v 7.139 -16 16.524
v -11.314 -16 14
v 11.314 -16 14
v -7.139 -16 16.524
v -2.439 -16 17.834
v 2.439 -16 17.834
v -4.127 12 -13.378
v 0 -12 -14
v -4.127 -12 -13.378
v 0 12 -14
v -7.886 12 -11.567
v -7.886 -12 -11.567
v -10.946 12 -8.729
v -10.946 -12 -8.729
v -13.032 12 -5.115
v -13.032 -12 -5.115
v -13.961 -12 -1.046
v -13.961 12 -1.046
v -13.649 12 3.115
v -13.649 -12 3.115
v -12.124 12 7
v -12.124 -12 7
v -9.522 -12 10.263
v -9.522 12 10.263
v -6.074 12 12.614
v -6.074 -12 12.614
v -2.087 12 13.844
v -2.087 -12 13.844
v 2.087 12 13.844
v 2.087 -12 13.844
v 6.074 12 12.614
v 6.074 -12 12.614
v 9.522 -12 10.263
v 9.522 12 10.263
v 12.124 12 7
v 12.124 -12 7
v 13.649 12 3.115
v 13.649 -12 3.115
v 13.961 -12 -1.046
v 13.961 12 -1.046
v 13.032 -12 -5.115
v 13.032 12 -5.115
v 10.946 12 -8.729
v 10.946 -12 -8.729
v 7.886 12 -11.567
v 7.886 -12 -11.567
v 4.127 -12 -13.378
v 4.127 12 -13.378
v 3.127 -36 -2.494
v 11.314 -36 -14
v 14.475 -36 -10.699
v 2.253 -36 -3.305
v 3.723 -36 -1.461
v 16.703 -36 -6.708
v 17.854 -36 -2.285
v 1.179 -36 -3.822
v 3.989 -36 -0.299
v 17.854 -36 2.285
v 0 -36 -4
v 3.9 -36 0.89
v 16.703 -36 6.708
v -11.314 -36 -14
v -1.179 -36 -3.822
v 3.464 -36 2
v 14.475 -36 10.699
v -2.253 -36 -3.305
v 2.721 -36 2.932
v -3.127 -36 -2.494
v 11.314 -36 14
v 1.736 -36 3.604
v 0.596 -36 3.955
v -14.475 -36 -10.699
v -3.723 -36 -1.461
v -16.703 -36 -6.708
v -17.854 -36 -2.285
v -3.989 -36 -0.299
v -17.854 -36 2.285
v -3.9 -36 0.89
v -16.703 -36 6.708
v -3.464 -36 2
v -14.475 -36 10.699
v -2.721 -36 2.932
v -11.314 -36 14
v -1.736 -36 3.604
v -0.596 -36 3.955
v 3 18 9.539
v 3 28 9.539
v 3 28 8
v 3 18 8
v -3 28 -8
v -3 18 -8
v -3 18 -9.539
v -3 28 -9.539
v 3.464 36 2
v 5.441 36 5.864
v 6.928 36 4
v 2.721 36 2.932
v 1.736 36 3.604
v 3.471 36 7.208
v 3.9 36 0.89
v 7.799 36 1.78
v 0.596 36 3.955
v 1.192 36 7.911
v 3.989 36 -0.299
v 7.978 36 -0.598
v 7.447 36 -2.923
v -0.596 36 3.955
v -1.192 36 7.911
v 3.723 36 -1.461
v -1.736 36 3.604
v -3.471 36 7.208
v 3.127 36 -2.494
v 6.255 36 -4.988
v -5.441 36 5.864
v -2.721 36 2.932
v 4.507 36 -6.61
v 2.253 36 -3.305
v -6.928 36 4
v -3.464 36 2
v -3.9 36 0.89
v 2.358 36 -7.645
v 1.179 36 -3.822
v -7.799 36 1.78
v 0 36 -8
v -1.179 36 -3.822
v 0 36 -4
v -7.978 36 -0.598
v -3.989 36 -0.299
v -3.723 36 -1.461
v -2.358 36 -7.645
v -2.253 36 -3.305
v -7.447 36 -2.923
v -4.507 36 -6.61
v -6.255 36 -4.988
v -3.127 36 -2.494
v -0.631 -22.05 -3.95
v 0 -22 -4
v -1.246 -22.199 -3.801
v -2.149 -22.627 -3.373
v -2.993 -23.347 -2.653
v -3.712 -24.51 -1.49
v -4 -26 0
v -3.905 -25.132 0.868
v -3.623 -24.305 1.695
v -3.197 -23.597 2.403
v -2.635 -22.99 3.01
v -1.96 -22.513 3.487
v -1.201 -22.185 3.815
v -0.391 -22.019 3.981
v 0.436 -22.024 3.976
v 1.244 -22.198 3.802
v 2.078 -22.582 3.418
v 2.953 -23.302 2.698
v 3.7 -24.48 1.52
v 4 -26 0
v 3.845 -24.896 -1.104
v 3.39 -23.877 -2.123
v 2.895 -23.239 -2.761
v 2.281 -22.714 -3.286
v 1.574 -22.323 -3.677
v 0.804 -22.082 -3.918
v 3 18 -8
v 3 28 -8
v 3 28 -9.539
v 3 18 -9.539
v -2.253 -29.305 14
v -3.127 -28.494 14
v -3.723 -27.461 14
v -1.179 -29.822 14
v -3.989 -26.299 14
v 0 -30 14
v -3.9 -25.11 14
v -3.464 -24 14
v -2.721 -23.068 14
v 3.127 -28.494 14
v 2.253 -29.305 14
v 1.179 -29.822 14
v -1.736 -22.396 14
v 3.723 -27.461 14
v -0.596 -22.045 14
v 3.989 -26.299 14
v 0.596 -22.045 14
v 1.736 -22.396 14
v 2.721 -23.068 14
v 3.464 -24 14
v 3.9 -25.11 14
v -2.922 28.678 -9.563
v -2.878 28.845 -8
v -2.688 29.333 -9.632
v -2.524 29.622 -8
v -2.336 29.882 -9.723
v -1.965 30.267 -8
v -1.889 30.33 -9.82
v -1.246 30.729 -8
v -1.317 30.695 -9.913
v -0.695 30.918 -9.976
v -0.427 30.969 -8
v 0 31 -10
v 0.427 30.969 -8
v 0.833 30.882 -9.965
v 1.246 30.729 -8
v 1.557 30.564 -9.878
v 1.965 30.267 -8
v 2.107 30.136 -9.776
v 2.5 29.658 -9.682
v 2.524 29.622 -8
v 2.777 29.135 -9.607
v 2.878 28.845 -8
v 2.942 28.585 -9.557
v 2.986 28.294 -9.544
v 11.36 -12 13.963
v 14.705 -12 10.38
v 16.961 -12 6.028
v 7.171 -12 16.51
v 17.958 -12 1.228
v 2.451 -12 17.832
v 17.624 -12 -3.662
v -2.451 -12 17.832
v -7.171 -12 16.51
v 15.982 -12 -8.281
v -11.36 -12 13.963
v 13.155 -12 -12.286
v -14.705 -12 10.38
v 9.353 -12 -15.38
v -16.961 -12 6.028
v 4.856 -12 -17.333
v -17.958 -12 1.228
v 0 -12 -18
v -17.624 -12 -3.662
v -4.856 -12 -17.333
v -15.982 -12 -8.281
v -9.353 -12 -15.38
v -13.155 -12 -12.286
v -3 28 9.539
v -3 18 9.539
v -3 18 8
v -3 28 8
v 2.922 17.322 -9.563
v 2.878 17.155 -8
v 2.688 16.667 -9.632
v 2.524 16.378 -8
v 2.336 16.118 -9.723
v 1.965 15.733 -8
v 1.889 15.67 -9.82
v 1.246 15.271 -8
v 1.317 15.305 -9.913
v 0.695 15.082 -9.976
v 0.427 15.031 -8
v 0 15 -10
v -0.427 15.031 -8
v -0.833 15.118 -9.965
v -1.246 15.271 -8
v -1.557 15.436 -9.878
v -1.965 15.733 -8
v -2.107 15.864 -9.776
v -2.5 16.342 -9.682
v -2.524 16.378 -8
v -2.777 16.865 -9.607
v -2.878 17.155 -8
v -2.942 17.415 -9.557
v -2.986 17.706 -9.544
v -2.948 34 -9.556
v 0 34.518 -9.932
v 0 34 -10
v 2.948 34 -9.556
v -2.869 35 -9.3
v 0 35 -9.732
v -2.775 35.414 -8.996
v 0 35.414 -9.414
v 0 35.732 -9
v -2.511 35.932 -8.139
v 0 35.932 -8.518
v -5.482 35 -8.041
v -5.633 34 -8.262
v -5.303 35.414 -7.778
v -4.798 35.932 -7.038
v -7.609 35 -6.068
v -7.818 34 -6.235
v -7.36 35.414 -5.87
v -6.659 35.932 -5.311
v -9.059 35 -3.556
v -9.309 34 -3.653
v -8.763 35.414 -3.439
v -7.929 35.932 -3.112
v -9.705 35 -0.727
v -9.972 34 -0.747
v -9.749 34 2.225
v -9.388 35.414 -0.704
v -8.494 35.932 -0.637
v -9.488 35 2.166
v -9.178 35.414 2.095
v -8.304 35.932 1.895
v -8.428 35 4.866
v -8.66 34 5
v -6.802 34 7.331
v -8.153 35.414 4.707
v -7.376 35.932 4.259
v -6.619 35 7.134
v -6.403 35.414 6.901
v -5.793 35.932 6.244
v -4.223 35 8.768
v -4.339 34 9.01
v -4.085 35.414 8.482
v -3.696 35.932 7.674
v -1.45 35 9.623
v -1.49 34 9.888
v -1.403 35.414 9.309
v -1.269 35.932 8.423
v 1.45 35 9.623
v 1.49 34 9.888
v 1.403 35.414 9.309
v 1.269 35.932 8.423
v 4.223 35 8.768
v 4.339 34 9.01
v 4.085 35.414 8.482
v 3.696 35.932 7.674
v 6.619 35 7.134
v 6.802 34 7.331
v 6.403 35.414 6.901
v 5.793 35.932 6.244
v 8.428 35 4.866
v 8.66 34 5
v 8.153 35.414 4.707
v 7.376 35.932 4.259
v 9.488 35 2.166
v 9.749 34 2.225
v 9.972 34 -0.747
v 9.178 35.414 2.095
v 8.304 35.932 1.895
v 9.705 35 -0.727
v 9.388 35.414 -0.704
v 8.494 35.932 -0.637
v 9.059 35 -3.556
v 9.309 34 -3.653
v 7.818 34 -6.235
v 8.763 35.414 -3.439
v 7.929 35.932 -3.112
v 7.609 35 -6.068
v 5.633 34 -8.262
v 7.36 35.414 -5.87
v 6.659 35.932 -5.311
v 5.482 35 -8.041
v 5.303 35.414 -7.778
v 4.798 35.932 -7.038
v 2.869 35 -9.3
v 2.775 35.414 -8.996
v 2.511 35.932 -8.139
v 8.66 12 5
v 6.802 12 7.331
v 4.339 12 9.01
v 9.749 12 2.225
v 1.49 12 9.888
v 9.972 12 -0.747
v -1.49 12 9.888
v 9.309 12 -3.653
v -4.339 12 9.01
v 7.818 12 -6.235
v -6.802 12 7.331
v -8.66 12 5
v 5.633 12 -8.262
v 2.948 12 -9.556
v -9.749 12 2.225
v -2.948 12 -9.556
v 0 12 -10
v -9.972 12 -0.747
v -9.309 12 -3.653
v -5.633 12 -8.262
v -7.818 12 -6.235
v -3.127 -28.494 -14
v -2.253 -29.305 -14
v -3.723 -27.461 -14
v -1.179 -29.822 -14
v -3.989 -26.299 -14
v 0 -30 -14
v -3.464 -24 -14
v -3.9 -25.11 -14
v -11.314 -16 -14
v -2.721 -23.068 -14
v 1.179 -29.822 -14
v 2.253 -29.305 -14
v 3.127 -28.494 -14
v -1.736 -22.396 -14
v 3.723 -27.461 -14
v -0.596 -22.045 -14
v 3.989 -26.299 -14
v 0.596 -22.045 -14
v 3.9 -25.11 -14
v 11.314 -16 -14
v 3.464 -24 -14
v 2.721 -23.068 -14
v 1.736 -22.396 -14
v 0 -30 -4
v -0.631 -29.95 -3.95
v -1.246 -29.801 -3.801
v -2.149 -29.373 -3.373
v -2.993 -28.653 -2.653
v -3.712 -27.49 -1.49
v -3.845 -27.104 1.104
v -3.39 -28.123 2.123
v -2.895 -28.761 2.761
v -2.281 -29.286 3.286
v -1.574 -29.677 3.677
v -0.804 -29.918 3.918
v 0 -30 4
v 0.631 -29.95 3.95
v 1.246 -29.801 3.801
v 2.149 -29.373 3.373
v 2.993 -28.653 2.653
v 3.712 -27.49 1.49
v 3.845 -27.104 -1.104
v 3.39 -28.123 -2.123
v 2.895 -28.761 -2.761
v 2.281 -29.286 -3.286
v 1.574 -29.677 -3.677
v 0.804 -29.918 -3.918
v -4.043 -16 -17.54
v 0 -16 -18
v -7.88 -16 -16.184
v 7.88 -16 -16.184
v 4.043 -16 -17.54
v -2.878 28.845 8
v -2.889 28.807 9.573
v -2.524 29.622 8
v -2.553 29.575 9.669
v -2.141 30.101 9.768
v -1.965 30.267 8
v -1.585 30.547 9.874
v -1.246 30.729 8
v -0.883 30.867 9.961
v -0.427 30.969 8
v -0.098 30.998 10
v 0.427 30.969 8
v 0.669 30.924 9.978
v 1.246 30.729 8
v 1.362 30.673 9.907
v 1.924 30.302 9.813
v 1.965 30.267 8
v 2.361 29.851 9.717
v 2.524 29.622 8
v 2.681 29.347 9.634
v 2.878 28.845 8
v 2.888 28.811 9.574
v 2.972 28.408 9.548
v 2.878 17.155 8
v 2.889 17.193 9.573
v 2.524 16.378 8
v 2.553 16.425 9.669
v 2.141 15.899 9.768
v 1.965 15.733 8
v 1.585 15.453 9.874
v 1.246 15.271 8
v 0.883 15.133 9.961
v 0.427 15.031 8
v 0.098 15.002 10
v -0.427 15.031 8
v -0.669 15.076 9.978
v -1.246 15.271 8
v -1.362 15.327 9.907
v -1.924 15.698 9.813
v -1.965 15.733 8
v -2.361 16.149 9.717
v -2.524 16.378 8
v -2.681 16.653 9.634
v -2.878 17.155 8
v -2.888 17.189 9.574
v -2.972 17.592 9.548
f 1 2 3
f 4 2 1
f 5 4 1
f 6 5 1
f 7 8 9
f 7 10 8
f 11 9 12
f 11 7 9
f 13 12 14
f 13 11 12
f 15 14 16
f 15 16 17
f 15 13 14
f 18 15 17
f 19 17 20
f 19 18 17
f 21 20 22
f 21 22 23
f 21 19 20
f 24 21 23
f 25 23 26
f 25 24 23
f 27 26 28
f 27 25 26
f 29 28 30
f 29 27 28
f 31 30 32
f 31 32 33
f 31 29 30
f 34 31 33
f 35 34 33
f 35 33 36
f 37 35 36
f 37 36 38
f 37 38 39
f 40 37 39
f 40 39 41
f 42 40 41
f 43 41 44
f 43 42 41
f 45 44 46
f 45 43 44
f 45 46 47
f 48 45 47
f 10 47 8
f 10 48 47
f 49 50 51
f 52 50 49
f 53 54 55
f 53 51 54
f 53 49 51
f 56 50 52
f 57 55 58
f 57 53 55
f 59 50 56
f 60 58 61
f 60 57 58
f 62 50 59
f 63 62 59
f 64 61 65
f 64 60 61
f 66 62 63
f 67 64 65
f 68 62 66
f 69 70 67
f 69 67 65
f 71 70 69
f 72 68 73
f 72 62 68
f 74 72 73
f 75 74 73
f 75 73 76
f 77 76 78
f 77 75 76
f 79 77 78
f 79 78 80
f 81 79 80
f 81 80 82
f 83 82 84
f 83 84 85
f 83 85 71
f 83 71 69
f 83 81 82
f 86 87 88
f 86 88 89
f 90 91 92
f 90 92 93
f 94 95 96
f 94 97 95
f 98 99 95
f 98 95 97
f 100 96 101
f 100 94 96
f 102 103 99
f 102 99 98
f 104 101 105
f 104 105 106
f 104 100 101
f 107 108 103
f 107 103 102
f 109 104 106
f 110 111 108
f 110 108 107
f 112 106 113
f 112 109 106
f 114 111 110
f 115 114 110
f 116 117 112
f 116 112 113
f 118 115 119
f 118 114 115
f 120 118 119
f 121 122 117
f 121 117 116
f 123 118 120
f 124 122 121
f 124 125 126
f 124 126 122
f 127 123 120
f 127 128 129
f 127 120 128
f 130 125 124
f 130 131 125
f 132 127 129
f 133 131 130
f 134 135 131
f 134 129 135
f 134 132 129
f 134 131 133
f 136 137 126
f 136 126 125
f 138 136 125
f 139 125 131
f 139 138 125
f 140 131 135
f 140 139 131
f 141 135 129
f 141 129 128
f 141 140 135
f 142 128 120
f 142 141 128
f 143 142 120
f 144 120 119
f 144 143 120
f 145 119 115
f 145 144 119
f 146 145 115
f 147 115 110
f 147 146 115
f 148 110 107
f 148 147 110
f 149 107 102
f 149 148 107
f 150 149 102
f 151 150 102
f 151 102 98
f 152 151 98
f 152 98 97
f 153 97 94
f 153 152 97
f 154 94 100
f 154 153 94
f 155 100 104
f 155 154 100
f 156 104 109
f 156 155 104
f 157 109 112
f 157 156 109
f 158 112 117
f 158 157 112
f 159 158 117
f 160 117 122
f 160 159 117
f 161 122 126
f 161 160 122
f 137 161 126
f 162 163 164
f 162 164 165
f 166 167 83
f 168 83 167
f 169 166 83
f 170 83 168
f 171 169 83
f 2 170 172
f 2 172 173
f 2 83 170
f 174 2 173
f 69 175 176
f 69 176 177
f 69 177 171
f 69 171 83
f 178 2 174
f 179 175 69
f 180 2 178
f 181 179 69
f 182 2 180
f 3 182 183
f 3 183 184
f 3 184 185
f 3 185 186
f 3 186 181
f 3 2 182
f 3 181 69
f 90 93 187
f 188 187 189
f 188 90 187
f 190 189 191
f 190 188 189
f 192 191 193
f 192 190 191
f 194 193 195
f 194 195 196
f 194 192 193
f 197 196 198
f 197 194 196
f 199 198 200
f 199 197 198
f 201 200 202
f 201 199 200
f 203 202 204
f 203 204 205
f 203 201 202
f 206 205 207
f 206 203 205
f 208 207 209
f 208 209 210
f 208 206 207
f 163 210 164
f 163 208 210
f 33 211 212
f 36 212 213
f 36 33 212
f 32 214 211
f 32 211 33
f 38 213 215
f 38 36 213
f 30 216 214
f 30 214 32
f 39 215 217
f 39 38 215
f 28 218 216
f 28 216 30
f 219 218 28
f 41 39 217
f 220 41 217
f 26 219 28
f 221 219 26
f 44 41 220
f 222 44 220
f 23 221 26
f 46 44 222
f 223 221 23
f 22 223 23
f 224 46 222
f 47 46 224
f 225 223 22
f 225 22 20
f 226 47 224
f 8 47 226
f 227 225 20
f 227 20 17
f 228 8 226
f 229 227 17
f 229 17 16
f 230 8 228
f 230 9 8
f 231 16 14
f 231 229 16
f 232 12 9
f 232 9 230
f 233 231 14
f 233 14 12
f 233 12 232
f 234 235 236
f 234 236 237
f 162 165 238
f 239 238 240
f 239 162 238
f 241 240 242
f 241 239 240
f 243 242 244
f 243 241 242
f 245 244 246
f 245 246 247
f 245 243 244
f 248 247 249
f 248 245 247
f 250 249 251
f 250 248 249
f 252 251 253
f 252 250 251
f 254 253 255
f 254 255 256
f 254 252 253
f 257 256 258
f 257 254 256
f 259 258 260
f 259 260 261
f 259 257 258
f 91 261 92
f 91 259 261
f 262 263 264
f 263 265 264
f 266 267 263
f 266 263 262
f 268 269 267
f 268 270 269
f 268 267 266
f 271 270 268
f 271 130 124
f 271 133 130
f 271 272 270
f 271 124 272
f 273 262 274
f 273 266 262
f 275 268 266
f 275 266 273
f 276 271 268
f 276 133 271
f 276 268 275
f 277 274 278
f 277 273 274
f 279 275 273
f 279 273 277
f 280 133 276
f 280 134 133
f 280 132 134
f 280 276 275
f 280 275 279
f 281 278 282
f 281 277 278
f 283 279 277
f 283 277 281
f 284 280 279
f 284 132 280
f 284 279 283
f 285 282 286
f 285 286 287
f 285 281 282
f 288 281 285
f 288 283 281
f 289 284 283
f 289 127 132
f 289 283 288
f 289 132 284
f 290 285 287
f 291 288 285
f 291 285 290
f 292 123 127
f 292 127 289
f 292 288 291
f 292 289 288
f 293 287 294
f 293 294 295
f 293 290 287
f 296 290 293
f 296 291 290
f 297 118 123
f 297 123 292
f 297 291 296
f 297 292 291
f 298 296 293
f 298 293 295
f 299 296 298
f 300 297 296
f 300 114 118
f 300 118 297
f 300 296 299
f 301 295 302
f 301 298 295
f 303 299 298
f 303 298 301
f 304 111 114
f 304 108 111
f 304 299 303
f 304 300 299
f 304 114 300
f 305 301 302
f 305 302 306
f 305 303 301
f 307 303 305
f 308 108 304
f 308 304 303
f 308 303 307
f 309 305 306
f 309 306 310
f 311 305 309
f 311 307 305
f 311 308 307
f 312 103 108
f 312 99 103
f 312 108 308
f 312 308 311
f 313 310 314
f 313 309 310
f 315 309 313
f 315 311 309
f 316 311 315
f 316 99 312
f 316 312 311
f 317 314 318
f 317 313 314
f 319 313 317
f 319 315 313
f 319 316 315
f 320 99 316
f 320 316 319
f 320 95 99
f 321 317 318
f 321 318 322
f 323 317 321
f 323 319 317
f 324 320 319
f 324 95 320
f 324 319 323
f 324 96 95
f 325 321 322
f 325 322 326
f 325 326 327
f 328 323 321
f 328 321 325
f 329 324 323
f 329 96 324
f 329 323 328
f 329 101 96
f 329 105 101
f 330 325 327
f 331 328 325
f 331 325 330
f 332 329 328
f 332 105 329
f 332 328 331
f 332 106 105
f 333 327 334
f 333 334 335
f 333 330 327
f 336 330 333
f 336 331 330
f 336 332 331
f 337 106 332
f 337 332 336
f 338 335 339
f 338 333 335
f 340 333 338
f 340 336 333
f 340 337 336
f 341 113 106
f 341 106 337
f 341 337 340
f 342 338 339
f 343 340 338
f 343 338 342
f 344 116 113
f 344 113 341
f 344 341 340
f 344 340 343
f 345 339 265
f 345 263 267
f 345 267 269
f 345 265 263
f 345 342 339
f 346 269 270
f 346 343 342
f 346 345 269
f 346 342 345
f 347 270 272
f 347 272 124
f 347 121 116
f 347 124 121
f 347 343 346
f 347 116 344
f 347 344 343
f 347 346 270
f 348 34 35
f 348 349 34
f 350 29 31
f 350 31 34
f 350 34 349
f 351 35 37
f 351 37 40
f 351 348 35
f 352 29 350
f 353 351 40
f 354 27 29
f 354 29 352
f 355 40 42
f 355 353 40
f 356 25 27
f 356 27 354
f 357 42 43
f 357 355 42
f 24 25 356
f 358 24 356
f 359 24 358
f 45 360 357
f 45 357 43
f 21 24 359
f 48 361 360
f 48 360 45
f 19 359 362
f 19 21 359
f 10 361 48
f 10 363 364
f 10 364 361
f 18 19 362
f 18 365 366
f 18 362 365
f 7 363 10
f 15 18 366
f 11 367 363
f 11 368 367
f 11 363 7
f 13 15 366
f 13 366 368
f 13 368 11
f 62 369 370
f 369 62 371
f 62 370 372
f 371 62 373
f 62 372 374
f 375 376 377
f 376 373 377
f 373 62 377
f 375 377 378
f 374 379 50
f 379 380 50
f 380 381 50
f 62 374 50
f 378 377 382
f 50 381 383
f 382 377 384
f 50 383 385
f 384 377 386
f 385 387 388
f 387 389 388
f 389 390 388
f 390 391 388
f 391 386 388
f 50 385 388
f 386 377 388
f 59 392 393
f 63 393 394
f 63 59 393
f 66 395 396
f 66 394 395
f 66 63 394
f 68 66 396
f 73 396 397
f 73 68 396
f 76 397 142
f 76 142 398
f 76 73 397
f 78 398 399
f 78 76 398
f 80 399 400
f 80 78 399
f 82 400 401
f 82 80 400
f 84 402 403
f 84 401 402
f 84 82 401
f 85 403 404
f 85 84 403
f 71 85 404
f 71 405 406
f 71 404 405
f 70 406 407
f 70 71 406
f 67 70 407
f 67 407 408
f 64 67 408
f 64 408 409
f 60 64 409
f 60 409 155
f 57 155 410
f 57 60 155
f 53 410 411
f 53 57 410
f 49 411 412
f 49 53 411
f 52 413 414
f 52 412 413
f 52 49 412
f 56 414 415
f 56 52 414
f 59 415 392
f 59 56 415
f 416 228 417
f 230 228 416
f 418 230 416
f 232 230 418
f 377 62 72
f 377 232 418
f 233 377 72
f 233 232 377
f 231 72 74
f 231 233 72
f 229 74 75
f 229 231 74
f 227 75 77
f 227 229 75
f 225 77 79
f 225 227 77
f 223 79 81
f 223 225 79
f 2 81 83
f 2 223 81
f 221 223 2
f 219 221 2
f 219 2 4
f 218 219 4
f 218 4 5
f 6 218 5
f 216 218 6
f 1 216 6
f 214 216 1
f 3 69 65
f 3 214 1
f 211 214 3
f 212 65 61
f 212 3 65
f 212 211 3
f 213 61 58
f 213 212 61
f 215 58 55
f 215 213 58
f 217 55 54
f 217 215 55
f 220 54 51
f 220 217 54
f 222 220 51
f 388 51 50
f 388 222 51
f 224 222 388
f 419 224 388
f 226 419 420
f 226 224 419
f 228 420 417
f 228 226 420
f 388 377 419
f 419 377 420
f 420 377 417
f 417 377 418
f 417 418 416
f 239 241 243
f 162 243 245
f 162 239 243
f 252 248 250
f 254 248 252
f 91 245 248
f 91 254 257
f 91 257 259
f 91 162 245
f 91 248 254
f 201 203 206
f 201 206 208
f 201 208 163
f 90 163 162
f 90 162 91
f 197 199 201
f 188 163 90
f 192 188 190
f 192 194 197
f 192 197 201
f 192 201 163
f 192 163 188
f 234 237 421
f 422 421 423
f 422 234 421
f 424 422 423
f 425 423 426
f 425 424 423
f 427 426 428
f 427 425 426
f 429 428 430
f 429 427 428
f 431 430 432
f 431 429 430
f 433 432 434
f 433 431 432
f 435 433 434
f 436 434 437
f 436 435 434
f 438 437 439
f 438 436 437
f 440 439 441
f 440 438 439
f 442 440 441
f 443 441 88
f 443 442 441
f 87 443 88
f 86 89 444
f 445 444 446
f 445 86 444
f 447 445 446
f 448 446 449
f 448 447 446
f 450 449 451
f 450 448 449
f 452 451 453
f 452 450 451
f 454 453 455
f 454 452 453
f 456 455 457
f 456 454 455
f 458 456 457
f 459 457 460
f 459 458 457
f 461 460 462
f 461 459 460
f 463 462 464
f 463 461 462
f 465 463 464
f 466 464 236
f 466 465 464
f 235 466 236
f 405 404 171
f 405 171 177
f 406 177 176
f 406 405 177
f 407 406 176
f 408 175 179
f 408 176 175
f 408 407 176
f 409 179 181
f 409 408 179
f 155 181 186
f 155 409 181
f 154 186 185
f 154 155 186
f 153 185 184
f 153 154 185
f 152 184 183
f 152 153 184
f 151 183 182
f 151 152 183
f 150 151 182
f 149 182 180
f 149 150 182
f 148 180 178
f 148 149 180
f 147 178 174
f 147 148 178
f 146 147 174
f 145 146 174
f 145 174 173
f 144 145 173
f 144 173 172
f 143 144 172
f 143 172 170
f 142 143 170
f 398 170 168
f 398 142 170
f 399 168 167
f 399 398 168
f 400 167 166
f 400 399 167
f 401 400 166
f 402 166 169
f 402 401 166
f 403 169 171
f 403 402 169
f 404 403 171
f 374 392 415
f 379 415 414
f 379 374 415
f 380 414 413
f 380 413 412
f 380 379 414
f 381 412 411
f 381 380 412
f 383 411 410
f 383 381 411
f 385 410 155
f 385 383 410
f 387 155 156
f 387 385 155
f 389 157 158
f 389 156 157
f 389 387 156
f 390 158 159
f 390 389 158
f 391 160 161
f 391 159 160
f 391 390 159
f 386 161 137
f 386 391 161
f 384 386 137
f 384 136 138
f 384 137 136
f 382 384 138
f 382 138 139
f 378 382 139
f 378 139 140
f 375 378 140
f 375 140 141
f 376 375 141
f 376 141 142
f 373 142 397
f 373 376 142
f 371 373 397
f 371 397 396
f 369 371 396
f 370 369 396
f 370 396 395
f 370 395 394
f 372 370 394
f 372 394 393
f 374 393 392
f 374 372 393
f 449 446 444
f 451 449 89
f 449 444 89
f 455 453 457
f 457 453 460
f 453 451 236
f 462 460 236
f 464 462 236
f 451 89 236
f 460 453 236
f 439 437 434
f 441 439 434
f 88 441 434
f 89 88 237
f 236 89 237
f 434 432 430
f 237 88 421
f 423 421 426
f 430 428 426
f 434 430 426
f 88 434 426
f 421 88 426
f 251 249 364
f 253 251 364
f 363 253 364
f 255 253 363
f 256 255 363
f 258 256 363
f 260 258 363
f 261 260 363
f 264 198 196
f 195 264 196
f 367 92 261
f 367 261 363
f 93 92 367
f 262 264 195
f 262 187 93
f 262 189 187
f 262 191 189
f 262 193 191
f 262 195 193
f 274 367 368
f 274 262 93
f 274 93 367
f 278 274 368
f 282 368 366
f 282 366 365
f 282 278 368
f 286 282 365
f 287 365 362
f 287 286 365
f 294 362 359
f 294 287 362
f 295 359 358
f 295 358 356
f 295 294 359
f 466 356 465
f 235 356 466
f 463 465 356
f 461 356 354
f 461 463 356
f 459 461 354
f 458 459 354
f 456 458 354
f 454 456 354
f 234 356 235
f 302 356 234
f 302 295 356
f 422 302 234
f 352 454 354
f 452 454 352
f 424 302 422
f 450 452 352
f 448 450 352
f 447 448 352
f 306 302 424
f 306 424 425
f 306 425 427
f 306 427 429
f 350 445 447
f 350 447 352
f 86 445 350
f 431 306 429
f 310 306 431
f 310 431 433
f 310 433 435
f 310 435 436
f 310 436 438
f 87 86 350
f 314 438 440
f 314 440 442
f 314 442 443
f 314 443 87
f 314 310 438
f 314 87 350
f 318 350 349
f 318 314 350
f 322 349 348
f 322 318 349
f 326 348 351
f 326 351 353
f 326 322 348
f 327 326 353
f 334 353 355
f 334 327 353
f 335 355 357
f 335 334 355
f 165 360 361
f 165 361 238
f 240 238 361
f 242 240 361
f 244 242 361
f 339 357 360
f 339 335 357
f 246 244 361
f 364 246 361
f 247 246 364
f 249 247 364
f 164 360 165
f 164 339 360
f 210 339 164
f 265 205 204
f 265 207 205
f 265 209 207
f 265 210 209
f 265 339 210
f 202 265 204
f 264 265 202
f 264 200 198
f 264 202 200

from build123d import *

# Parameters (mm, degrees)
CUT_EXTRUDE2_DEPTH      = 45.09081537
CUT_EXTRUDE2_DEPTH_BACK = 45.09081537
SKETCH2_R               = 4
CUT_EXTRUDE3_START      = -14
SKETCH2_4_W             = 30
SKETCH2_4_H             = 25.460379871
SKETCH2_4_R             = 4
CUT_EXTRUDE3_DEPTH      = 31.090815533
CUT_EXTRUDE4_START      = 14
SKETCH2_5_W             = 30
SKETCH2_5_H             = 25.460379871
SKETCH2_5_R             = 4
CUT_EXTRUDE4_DEPTH      = 31.090815533
CUT_EXTRUDE5_START      = -8
CUT_EXTRUDE5_DEPTH      = 10
CUT_EXTRUDE6_START      = 18
CUT_EXTRUDE6_DEPTH      = 10


with BuildPart() as part:
    # Sketch1 → Revolve1 (revolve)
    with BuildSketch(Plane.XY):
        with BuildLine():
            Line((18, -36), (18, -12))
            Line((18, -12), (14, -12))
            Line((14, -12), (14, 12))
            Line((14, 12), (10, 12))
            Line((10, 12), (10, 34))
            ThreePointArc((10, 34), (9.414213562, 35.414213562), (8, 36))
            Line((8, 36), (4, 36))
            Line((4, 36), (4, -36))
            Line((4, -36), (18, -36))
        make_face()
    revolve(axis=Axis((0, -36, 0), (0, 1, 0)))

    # Sketch2 → Cut-Extrude2 (cut, two sides: drawn at the far end of the back side and taken through both)
    with BuildSketch(Plane.XY.offset(-CUT_EXTRUDE2_DEPTH_BACK)):
        with Locations((0, -26)):
            Circle(SKETCH2_R)
    extrude(amount=CUT_EXTRUDE2_DEPTH + CUT_EXTRUDE2_DEPTH_BACK, mode=Mode.SUBTRACT)

    # Sketch2<4> → Cut-Extrude3 (cut, through all)
    with BuildSketch(Plane.XY.offset(CUT_EXTRUDE3_START)):
        with Locations((0, -28.730189936)):
            Rectangle(SKETCH2_4_W, SKETCH2_4_H)
        with Locations((0, -26)):
            Circle(SKETCH2_4_R, mode=Mode.SUBTRACT)
    extrude(amount=-CUT_EXTRUDE3_DEPTH, mode=Mode.SUBTRACT)

    # Sketch2<5> → Cut-Extrude4 (cut, through all)
    with BuildSketch(Plane.XY.offset(CUT_EXTRUDE4_START)):
        with Locations((0, -28.730189936)):
            Rectangle(SKETCH2_5_W, SKETCH2_5_H)
        with Locations((0, -26)):
            Circle(SKETCH2_5_R, mode=Mode.SUBTRACT)
    extrude(amount=CUT_EXTRUDE4_DEPTH, mode=Mode.SUBTRACT)

    # Sketch4 → Cut-Extrude5 (cut)
    with BuildSketch(Plane.XY.offset(CUT_EXTRUDE5_START)):
        with BuildLine():
            Line((3, 28), (3, 18))
            ThreePointArc((3, 18), (0, 15), (-3, 18))
            Line((-3, 18), (-3, 28))
            ThreePointArc((-3, 28), (0, 31), (3, 28))
        make_face()
    extrude(amount=-CUT_EXTRUDE5_DEPTH, mode=Mode.SUBTRACT)

    # Sketch4<2> → Cut-Extrude6 (cut)
    with BuildSketch(Plane.XY.offset(CUT_EXTRUDE6_START)):
        with BuildLine():
            Line((3, 28), (3, 18))
            ThreePointArc((3, 18), (0, 15), (-3, 18))
            Line((-3, 18), (-3, 28))
            ThreePointArc((-3, 28), (0, 31), (3, 28))
        make_face()
    extrude(amount=-CUT_EXTRUDE6_DEPTH, mode=Mode.SUBTRACT)


solid = part.part
